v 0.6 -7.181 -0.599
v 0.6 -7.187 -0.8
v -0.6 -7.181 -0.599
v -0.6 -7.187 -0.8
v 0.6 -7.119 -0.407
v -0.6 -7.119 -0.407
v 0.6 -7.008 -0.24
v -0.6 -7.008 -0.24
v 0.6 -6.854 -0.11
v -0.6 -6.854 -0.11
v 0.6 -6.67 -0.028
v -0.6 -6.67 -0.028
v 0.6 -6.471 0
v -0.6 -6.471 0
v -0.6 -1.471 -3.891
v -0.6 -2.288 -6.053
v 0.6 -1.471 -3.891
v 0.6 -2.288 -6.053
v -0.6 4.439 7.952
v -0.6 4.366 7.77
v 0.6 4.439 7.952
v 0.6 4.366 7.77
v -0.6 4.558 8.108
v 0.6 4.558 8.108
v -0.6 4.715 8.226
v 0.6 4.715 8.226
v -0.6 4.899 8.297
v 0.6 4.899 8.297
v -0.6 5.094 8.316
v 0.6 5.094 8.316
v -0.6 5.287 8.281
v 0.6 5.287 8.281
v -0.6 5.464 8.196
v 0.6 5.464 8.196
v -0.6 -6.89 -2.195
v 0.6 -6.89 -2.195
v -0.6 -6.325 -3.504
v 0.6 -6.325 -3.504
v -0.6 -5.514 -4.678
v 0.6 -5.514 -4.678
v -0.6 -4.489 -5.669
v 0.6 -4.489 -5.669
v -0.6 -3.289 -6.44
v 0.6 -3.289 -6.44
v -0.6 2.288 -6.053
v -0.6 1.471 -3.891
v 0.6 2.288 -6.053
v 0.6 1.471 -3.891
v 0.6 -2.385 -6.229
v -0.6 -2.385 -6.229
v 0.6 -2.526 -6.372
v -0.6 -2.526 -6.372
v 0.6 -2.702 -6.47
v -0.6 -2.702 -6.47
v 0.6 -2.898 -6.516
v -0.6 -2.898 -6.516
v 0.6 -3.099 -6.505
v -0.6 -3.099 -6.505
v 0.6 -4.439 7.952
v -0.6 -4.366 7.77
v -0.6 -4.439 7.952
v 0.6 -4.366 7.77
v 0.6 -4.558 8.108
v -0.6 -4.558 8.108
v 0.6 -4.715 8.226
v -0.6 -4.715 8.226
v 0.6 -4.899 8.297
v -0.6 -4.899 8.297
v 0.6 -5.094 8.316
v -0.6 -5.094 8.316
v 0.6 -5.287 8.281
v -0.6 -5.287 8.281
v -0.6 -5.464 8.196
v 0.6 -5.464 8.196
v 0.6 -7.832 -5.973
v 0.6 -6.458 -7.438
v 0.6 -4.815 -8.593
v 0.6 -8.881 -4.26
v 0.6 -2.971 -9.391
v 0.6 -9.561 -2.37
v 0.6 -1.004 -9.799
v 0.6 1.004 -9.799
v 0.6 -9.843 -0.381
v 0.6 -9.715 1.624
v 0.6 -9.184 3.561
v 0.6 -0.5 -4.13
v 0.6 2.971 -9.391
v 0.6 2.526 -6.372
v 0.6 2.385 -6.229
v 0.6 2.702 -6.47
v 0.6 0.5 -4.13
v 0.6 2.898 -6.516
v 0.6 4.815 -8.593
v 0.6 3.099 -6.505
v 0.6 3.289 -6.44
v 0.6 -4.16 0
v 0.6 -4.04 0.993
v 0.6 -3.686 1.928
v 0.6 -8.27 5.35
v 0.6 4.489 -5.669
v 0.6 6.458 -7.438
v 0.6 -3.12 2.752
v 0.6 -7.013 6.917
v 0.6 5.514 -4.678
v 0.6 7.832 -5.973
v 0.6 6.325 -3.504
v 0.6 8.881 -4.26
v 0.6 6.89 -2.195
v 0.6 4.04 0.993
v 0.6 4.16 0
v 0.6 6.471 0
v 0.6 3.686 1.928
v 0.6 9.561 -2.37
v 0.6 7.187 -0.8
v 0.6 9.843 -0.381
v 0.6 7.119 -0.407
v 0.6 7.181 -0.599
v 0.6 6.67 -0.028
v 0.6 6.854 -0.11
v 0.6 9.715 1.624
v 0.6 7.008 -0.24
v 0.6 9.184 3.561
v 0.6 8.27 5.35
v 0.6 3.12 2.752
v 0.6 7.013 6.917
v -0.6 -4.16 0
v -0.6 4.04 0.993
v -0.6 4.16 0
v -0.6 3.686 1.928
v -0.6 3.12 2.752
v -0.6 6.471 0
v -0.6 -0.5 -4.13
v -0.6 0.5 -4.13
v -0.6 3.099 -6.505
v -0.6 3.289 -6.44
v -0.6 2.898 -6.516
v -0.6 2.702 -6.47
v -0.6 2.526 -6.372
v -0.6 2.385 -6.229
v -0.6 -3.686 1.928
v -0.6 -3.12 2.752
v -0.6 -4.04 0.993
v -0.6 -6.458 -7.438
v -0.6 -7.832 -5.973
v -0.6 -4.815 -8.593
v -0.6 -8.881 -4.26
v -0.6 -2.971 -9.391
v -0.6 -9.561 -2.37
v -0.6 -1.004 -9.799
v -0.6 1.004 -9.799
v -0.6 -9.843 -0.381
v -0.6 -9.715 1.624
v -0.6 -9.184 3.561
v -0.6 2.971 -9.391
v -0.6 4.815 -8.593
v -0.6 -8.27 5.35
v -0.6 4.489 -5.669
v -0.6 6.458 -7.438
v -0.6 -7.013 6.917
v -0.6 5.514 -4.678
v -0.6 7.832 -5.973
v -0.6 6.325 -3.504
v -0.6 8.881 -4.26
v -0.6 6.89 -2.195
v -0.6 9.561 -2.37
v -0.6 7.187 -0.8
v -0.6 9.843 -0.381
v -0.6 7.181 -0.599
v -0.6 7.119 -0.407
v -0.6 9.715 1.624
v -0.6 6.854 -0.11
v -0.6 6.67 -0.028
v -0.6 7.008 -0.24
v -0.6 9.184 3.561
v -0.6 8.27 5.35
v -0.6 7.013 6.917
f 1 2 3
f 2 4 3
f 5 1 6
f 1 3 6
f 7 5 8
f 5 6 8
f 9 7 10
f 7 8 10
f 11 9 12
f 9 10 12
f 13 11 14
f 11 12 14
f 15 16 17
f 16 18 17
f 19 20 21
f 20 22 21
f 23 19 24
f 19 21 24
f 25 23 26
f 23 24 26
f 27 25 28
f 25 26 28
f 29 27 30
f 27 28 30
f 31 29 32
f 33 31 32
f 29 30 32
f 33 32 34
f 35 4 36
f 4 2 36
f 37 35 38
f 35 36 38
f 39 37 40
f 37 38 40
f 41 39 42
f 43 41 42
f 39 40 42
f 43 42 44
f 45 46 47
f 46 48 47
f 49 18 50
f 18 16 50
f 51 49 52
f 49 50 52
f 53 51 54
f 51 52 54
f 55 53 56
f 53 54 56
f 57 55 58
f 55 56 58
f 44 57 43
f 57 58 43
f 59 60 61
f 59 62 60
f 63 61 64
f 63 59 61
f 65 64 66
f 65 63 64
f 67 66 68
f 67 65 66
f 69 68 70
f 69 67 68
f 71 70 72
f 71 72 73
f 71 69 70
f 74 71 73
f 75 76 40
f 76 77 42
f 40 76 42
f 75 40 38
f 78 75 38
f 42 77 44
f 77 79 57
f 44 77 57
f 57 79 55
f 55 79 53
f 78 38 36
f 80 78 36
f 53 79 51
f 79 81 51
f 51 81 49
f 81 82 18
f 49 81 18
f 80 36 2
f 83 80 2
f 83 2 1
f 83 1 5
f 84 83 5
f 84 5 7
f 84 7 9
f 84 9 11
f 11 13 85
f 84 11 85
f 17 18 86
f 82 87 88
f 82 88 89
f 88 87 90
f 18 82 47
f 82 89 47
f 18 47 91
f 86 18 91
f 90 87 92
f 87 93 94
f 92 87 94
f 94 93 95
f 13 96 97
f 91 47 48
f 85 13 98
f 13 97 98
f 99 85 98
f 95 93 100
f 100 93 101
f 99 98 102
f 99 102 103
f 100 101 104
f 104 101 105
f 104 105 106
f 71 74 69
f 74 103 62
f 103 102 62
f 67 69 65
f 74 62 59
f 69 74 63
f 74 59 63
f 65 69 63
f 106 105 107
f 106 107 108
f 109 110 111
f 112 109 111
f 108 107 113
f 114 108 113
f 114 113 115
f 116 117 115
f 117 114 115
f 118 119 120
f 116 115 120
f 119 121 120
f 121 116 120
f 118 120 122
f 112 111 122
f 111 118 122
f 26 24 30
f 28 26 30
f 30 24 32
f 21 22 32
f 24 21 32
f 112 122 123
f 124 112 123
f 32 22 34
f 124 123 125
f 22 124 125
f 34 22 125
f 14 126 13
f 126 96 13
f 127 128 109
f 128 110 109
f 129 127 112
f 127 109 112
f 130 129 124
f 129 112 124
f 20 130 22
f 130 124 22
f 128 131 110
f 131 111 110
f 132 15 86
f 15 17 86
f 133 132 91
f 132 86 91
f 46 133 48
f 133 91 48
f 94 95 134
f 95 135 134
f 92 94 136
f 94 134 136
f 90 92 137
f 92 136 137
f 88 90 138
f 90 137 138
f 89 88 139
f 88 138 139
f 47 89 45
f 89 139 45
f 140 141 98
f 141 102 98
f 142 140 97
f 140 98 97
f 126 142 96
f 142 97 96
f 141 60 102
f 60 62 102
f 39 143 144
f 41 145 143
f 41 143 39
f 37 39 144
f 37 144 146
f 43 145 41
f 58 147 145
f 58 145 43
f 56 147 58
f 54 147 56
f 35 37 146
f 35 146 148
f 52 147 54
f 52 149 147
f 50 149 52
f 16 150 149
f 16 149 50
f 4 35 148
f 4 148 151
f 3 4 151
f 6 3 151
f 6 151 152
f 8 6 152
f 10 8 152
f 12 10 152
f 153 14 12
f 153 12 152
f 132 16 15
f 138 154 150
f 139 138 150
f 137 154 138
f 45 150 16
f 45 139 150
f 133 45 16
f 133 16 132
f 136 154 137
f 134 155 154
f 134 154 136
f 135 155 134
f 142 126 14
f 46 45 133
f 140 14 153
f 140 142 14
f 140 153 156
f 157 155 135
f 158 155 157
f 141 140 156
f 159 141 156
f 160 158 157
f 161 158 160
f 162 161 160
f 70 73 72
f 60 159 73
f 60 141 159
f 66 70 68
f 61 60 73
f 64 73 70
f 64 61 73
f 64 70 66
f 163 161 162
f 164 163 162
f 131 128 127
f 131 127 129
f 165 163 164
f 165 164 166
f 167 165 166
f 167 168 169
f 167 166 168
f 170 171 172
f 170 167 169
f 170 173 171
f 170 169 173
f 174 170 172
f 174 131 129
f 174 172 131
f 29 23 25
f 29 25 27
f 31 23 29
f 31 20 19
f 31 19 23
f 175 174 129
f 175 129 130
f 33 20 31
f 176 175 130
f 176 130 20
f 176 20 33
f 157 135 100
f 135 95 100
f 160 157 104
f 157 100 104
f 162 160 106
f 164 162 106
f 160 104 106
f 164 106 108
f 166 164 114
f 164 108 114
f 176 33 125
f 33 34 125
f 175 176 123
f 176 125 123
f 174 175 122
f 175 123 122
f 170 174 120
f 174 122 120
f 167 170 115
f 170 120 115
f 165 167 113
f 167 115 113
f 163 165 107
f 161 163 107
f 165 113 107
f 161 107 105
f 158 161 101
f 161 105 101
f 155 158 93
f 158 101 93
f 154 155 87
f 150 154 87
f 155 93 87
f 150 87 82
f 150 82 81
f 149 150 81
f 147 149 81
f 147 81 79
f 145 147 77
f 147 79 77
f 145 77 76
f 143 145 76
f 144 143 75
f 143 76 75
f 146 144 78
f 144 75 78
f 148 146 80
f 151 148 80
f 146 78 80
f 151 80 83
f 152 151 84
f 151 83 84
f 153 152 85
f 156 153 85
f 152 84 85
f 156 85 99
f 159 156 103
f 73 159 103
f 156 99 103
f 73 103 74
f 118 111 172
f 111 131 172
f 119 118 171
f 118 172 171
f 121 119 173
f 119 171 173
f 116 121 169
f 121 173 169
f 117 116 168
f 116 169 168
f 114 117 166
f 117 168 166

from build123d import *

# Parameters (mm, degrees)
EXTRUDE1_DEPTH = 0.6
FILLET1_R      = 0.72


with BuildPart() as part:
    # Sketch1 → Extrude1 (new body, symmetric)
    with BuildSketch(Plane(origin=(0, 0, 0), x_dir=(0, 0, -1), z_dir=(1, 0, 0))):
        with BuildLine():
            Line((-8.710253959, -4.599345167), (-2.751581364, -3.12))
            ThreePointArc((-2.751581364, -3.12), (-1.470782105, -3.891323682), (0, -4.16))
            Line((0, -4.16), (0, -7.230967742))
            ThreePointArc((0, -7.230967742), (4.111002655, -5.948659652), (6.763950966, -2.556533162))
            Line((6.763950966, -2.556533162), (3.891323682, -1.470782105))
            ThreePointArc((3.891323682, -1.470782105), (4.16, 0), (3.891323682, 1.470782105))
            Line((3.891323682, 1.470782105), (6.763950966, 2.556533162))
            ThreePointArc((6.763950966, 2.556533162), (4.111002655, 5.948659652), (0, 7.230967742))
            Line((0, 7.230967742), (0, 4.16))
            ThreePointArc((0, 4.16), (-1.470782105, 3.891323682), (-2.751581364, 3.12))
            Line((-2.751581364, 3.12), (-8.710253959, 4.599345167))
            ThreePointArc((-8.710253959, 4.599345167), (9.85, 0), (-8.710253959, -4.599345167))
        make_face()
    extrude(amount=EXTRUDE1_DEPTH, both=True)

    # Fillet1
    fillet1_edges = [part.edges().sort_by_distance(p)[0] for p in [
        (0, -4.599345167, 8.710253959),
        (0, -7.230967742, 0),
        (0, -2.556533162, -6.763950966),
        (0, 2.556533162, -6.763950966),
        (0, 7.230967742, 0),
        (0, 4.599345167, 8.710253959),
    ]]
    fillet(fillet1_edges, radius=FILLET1_R)


solid = part.part
